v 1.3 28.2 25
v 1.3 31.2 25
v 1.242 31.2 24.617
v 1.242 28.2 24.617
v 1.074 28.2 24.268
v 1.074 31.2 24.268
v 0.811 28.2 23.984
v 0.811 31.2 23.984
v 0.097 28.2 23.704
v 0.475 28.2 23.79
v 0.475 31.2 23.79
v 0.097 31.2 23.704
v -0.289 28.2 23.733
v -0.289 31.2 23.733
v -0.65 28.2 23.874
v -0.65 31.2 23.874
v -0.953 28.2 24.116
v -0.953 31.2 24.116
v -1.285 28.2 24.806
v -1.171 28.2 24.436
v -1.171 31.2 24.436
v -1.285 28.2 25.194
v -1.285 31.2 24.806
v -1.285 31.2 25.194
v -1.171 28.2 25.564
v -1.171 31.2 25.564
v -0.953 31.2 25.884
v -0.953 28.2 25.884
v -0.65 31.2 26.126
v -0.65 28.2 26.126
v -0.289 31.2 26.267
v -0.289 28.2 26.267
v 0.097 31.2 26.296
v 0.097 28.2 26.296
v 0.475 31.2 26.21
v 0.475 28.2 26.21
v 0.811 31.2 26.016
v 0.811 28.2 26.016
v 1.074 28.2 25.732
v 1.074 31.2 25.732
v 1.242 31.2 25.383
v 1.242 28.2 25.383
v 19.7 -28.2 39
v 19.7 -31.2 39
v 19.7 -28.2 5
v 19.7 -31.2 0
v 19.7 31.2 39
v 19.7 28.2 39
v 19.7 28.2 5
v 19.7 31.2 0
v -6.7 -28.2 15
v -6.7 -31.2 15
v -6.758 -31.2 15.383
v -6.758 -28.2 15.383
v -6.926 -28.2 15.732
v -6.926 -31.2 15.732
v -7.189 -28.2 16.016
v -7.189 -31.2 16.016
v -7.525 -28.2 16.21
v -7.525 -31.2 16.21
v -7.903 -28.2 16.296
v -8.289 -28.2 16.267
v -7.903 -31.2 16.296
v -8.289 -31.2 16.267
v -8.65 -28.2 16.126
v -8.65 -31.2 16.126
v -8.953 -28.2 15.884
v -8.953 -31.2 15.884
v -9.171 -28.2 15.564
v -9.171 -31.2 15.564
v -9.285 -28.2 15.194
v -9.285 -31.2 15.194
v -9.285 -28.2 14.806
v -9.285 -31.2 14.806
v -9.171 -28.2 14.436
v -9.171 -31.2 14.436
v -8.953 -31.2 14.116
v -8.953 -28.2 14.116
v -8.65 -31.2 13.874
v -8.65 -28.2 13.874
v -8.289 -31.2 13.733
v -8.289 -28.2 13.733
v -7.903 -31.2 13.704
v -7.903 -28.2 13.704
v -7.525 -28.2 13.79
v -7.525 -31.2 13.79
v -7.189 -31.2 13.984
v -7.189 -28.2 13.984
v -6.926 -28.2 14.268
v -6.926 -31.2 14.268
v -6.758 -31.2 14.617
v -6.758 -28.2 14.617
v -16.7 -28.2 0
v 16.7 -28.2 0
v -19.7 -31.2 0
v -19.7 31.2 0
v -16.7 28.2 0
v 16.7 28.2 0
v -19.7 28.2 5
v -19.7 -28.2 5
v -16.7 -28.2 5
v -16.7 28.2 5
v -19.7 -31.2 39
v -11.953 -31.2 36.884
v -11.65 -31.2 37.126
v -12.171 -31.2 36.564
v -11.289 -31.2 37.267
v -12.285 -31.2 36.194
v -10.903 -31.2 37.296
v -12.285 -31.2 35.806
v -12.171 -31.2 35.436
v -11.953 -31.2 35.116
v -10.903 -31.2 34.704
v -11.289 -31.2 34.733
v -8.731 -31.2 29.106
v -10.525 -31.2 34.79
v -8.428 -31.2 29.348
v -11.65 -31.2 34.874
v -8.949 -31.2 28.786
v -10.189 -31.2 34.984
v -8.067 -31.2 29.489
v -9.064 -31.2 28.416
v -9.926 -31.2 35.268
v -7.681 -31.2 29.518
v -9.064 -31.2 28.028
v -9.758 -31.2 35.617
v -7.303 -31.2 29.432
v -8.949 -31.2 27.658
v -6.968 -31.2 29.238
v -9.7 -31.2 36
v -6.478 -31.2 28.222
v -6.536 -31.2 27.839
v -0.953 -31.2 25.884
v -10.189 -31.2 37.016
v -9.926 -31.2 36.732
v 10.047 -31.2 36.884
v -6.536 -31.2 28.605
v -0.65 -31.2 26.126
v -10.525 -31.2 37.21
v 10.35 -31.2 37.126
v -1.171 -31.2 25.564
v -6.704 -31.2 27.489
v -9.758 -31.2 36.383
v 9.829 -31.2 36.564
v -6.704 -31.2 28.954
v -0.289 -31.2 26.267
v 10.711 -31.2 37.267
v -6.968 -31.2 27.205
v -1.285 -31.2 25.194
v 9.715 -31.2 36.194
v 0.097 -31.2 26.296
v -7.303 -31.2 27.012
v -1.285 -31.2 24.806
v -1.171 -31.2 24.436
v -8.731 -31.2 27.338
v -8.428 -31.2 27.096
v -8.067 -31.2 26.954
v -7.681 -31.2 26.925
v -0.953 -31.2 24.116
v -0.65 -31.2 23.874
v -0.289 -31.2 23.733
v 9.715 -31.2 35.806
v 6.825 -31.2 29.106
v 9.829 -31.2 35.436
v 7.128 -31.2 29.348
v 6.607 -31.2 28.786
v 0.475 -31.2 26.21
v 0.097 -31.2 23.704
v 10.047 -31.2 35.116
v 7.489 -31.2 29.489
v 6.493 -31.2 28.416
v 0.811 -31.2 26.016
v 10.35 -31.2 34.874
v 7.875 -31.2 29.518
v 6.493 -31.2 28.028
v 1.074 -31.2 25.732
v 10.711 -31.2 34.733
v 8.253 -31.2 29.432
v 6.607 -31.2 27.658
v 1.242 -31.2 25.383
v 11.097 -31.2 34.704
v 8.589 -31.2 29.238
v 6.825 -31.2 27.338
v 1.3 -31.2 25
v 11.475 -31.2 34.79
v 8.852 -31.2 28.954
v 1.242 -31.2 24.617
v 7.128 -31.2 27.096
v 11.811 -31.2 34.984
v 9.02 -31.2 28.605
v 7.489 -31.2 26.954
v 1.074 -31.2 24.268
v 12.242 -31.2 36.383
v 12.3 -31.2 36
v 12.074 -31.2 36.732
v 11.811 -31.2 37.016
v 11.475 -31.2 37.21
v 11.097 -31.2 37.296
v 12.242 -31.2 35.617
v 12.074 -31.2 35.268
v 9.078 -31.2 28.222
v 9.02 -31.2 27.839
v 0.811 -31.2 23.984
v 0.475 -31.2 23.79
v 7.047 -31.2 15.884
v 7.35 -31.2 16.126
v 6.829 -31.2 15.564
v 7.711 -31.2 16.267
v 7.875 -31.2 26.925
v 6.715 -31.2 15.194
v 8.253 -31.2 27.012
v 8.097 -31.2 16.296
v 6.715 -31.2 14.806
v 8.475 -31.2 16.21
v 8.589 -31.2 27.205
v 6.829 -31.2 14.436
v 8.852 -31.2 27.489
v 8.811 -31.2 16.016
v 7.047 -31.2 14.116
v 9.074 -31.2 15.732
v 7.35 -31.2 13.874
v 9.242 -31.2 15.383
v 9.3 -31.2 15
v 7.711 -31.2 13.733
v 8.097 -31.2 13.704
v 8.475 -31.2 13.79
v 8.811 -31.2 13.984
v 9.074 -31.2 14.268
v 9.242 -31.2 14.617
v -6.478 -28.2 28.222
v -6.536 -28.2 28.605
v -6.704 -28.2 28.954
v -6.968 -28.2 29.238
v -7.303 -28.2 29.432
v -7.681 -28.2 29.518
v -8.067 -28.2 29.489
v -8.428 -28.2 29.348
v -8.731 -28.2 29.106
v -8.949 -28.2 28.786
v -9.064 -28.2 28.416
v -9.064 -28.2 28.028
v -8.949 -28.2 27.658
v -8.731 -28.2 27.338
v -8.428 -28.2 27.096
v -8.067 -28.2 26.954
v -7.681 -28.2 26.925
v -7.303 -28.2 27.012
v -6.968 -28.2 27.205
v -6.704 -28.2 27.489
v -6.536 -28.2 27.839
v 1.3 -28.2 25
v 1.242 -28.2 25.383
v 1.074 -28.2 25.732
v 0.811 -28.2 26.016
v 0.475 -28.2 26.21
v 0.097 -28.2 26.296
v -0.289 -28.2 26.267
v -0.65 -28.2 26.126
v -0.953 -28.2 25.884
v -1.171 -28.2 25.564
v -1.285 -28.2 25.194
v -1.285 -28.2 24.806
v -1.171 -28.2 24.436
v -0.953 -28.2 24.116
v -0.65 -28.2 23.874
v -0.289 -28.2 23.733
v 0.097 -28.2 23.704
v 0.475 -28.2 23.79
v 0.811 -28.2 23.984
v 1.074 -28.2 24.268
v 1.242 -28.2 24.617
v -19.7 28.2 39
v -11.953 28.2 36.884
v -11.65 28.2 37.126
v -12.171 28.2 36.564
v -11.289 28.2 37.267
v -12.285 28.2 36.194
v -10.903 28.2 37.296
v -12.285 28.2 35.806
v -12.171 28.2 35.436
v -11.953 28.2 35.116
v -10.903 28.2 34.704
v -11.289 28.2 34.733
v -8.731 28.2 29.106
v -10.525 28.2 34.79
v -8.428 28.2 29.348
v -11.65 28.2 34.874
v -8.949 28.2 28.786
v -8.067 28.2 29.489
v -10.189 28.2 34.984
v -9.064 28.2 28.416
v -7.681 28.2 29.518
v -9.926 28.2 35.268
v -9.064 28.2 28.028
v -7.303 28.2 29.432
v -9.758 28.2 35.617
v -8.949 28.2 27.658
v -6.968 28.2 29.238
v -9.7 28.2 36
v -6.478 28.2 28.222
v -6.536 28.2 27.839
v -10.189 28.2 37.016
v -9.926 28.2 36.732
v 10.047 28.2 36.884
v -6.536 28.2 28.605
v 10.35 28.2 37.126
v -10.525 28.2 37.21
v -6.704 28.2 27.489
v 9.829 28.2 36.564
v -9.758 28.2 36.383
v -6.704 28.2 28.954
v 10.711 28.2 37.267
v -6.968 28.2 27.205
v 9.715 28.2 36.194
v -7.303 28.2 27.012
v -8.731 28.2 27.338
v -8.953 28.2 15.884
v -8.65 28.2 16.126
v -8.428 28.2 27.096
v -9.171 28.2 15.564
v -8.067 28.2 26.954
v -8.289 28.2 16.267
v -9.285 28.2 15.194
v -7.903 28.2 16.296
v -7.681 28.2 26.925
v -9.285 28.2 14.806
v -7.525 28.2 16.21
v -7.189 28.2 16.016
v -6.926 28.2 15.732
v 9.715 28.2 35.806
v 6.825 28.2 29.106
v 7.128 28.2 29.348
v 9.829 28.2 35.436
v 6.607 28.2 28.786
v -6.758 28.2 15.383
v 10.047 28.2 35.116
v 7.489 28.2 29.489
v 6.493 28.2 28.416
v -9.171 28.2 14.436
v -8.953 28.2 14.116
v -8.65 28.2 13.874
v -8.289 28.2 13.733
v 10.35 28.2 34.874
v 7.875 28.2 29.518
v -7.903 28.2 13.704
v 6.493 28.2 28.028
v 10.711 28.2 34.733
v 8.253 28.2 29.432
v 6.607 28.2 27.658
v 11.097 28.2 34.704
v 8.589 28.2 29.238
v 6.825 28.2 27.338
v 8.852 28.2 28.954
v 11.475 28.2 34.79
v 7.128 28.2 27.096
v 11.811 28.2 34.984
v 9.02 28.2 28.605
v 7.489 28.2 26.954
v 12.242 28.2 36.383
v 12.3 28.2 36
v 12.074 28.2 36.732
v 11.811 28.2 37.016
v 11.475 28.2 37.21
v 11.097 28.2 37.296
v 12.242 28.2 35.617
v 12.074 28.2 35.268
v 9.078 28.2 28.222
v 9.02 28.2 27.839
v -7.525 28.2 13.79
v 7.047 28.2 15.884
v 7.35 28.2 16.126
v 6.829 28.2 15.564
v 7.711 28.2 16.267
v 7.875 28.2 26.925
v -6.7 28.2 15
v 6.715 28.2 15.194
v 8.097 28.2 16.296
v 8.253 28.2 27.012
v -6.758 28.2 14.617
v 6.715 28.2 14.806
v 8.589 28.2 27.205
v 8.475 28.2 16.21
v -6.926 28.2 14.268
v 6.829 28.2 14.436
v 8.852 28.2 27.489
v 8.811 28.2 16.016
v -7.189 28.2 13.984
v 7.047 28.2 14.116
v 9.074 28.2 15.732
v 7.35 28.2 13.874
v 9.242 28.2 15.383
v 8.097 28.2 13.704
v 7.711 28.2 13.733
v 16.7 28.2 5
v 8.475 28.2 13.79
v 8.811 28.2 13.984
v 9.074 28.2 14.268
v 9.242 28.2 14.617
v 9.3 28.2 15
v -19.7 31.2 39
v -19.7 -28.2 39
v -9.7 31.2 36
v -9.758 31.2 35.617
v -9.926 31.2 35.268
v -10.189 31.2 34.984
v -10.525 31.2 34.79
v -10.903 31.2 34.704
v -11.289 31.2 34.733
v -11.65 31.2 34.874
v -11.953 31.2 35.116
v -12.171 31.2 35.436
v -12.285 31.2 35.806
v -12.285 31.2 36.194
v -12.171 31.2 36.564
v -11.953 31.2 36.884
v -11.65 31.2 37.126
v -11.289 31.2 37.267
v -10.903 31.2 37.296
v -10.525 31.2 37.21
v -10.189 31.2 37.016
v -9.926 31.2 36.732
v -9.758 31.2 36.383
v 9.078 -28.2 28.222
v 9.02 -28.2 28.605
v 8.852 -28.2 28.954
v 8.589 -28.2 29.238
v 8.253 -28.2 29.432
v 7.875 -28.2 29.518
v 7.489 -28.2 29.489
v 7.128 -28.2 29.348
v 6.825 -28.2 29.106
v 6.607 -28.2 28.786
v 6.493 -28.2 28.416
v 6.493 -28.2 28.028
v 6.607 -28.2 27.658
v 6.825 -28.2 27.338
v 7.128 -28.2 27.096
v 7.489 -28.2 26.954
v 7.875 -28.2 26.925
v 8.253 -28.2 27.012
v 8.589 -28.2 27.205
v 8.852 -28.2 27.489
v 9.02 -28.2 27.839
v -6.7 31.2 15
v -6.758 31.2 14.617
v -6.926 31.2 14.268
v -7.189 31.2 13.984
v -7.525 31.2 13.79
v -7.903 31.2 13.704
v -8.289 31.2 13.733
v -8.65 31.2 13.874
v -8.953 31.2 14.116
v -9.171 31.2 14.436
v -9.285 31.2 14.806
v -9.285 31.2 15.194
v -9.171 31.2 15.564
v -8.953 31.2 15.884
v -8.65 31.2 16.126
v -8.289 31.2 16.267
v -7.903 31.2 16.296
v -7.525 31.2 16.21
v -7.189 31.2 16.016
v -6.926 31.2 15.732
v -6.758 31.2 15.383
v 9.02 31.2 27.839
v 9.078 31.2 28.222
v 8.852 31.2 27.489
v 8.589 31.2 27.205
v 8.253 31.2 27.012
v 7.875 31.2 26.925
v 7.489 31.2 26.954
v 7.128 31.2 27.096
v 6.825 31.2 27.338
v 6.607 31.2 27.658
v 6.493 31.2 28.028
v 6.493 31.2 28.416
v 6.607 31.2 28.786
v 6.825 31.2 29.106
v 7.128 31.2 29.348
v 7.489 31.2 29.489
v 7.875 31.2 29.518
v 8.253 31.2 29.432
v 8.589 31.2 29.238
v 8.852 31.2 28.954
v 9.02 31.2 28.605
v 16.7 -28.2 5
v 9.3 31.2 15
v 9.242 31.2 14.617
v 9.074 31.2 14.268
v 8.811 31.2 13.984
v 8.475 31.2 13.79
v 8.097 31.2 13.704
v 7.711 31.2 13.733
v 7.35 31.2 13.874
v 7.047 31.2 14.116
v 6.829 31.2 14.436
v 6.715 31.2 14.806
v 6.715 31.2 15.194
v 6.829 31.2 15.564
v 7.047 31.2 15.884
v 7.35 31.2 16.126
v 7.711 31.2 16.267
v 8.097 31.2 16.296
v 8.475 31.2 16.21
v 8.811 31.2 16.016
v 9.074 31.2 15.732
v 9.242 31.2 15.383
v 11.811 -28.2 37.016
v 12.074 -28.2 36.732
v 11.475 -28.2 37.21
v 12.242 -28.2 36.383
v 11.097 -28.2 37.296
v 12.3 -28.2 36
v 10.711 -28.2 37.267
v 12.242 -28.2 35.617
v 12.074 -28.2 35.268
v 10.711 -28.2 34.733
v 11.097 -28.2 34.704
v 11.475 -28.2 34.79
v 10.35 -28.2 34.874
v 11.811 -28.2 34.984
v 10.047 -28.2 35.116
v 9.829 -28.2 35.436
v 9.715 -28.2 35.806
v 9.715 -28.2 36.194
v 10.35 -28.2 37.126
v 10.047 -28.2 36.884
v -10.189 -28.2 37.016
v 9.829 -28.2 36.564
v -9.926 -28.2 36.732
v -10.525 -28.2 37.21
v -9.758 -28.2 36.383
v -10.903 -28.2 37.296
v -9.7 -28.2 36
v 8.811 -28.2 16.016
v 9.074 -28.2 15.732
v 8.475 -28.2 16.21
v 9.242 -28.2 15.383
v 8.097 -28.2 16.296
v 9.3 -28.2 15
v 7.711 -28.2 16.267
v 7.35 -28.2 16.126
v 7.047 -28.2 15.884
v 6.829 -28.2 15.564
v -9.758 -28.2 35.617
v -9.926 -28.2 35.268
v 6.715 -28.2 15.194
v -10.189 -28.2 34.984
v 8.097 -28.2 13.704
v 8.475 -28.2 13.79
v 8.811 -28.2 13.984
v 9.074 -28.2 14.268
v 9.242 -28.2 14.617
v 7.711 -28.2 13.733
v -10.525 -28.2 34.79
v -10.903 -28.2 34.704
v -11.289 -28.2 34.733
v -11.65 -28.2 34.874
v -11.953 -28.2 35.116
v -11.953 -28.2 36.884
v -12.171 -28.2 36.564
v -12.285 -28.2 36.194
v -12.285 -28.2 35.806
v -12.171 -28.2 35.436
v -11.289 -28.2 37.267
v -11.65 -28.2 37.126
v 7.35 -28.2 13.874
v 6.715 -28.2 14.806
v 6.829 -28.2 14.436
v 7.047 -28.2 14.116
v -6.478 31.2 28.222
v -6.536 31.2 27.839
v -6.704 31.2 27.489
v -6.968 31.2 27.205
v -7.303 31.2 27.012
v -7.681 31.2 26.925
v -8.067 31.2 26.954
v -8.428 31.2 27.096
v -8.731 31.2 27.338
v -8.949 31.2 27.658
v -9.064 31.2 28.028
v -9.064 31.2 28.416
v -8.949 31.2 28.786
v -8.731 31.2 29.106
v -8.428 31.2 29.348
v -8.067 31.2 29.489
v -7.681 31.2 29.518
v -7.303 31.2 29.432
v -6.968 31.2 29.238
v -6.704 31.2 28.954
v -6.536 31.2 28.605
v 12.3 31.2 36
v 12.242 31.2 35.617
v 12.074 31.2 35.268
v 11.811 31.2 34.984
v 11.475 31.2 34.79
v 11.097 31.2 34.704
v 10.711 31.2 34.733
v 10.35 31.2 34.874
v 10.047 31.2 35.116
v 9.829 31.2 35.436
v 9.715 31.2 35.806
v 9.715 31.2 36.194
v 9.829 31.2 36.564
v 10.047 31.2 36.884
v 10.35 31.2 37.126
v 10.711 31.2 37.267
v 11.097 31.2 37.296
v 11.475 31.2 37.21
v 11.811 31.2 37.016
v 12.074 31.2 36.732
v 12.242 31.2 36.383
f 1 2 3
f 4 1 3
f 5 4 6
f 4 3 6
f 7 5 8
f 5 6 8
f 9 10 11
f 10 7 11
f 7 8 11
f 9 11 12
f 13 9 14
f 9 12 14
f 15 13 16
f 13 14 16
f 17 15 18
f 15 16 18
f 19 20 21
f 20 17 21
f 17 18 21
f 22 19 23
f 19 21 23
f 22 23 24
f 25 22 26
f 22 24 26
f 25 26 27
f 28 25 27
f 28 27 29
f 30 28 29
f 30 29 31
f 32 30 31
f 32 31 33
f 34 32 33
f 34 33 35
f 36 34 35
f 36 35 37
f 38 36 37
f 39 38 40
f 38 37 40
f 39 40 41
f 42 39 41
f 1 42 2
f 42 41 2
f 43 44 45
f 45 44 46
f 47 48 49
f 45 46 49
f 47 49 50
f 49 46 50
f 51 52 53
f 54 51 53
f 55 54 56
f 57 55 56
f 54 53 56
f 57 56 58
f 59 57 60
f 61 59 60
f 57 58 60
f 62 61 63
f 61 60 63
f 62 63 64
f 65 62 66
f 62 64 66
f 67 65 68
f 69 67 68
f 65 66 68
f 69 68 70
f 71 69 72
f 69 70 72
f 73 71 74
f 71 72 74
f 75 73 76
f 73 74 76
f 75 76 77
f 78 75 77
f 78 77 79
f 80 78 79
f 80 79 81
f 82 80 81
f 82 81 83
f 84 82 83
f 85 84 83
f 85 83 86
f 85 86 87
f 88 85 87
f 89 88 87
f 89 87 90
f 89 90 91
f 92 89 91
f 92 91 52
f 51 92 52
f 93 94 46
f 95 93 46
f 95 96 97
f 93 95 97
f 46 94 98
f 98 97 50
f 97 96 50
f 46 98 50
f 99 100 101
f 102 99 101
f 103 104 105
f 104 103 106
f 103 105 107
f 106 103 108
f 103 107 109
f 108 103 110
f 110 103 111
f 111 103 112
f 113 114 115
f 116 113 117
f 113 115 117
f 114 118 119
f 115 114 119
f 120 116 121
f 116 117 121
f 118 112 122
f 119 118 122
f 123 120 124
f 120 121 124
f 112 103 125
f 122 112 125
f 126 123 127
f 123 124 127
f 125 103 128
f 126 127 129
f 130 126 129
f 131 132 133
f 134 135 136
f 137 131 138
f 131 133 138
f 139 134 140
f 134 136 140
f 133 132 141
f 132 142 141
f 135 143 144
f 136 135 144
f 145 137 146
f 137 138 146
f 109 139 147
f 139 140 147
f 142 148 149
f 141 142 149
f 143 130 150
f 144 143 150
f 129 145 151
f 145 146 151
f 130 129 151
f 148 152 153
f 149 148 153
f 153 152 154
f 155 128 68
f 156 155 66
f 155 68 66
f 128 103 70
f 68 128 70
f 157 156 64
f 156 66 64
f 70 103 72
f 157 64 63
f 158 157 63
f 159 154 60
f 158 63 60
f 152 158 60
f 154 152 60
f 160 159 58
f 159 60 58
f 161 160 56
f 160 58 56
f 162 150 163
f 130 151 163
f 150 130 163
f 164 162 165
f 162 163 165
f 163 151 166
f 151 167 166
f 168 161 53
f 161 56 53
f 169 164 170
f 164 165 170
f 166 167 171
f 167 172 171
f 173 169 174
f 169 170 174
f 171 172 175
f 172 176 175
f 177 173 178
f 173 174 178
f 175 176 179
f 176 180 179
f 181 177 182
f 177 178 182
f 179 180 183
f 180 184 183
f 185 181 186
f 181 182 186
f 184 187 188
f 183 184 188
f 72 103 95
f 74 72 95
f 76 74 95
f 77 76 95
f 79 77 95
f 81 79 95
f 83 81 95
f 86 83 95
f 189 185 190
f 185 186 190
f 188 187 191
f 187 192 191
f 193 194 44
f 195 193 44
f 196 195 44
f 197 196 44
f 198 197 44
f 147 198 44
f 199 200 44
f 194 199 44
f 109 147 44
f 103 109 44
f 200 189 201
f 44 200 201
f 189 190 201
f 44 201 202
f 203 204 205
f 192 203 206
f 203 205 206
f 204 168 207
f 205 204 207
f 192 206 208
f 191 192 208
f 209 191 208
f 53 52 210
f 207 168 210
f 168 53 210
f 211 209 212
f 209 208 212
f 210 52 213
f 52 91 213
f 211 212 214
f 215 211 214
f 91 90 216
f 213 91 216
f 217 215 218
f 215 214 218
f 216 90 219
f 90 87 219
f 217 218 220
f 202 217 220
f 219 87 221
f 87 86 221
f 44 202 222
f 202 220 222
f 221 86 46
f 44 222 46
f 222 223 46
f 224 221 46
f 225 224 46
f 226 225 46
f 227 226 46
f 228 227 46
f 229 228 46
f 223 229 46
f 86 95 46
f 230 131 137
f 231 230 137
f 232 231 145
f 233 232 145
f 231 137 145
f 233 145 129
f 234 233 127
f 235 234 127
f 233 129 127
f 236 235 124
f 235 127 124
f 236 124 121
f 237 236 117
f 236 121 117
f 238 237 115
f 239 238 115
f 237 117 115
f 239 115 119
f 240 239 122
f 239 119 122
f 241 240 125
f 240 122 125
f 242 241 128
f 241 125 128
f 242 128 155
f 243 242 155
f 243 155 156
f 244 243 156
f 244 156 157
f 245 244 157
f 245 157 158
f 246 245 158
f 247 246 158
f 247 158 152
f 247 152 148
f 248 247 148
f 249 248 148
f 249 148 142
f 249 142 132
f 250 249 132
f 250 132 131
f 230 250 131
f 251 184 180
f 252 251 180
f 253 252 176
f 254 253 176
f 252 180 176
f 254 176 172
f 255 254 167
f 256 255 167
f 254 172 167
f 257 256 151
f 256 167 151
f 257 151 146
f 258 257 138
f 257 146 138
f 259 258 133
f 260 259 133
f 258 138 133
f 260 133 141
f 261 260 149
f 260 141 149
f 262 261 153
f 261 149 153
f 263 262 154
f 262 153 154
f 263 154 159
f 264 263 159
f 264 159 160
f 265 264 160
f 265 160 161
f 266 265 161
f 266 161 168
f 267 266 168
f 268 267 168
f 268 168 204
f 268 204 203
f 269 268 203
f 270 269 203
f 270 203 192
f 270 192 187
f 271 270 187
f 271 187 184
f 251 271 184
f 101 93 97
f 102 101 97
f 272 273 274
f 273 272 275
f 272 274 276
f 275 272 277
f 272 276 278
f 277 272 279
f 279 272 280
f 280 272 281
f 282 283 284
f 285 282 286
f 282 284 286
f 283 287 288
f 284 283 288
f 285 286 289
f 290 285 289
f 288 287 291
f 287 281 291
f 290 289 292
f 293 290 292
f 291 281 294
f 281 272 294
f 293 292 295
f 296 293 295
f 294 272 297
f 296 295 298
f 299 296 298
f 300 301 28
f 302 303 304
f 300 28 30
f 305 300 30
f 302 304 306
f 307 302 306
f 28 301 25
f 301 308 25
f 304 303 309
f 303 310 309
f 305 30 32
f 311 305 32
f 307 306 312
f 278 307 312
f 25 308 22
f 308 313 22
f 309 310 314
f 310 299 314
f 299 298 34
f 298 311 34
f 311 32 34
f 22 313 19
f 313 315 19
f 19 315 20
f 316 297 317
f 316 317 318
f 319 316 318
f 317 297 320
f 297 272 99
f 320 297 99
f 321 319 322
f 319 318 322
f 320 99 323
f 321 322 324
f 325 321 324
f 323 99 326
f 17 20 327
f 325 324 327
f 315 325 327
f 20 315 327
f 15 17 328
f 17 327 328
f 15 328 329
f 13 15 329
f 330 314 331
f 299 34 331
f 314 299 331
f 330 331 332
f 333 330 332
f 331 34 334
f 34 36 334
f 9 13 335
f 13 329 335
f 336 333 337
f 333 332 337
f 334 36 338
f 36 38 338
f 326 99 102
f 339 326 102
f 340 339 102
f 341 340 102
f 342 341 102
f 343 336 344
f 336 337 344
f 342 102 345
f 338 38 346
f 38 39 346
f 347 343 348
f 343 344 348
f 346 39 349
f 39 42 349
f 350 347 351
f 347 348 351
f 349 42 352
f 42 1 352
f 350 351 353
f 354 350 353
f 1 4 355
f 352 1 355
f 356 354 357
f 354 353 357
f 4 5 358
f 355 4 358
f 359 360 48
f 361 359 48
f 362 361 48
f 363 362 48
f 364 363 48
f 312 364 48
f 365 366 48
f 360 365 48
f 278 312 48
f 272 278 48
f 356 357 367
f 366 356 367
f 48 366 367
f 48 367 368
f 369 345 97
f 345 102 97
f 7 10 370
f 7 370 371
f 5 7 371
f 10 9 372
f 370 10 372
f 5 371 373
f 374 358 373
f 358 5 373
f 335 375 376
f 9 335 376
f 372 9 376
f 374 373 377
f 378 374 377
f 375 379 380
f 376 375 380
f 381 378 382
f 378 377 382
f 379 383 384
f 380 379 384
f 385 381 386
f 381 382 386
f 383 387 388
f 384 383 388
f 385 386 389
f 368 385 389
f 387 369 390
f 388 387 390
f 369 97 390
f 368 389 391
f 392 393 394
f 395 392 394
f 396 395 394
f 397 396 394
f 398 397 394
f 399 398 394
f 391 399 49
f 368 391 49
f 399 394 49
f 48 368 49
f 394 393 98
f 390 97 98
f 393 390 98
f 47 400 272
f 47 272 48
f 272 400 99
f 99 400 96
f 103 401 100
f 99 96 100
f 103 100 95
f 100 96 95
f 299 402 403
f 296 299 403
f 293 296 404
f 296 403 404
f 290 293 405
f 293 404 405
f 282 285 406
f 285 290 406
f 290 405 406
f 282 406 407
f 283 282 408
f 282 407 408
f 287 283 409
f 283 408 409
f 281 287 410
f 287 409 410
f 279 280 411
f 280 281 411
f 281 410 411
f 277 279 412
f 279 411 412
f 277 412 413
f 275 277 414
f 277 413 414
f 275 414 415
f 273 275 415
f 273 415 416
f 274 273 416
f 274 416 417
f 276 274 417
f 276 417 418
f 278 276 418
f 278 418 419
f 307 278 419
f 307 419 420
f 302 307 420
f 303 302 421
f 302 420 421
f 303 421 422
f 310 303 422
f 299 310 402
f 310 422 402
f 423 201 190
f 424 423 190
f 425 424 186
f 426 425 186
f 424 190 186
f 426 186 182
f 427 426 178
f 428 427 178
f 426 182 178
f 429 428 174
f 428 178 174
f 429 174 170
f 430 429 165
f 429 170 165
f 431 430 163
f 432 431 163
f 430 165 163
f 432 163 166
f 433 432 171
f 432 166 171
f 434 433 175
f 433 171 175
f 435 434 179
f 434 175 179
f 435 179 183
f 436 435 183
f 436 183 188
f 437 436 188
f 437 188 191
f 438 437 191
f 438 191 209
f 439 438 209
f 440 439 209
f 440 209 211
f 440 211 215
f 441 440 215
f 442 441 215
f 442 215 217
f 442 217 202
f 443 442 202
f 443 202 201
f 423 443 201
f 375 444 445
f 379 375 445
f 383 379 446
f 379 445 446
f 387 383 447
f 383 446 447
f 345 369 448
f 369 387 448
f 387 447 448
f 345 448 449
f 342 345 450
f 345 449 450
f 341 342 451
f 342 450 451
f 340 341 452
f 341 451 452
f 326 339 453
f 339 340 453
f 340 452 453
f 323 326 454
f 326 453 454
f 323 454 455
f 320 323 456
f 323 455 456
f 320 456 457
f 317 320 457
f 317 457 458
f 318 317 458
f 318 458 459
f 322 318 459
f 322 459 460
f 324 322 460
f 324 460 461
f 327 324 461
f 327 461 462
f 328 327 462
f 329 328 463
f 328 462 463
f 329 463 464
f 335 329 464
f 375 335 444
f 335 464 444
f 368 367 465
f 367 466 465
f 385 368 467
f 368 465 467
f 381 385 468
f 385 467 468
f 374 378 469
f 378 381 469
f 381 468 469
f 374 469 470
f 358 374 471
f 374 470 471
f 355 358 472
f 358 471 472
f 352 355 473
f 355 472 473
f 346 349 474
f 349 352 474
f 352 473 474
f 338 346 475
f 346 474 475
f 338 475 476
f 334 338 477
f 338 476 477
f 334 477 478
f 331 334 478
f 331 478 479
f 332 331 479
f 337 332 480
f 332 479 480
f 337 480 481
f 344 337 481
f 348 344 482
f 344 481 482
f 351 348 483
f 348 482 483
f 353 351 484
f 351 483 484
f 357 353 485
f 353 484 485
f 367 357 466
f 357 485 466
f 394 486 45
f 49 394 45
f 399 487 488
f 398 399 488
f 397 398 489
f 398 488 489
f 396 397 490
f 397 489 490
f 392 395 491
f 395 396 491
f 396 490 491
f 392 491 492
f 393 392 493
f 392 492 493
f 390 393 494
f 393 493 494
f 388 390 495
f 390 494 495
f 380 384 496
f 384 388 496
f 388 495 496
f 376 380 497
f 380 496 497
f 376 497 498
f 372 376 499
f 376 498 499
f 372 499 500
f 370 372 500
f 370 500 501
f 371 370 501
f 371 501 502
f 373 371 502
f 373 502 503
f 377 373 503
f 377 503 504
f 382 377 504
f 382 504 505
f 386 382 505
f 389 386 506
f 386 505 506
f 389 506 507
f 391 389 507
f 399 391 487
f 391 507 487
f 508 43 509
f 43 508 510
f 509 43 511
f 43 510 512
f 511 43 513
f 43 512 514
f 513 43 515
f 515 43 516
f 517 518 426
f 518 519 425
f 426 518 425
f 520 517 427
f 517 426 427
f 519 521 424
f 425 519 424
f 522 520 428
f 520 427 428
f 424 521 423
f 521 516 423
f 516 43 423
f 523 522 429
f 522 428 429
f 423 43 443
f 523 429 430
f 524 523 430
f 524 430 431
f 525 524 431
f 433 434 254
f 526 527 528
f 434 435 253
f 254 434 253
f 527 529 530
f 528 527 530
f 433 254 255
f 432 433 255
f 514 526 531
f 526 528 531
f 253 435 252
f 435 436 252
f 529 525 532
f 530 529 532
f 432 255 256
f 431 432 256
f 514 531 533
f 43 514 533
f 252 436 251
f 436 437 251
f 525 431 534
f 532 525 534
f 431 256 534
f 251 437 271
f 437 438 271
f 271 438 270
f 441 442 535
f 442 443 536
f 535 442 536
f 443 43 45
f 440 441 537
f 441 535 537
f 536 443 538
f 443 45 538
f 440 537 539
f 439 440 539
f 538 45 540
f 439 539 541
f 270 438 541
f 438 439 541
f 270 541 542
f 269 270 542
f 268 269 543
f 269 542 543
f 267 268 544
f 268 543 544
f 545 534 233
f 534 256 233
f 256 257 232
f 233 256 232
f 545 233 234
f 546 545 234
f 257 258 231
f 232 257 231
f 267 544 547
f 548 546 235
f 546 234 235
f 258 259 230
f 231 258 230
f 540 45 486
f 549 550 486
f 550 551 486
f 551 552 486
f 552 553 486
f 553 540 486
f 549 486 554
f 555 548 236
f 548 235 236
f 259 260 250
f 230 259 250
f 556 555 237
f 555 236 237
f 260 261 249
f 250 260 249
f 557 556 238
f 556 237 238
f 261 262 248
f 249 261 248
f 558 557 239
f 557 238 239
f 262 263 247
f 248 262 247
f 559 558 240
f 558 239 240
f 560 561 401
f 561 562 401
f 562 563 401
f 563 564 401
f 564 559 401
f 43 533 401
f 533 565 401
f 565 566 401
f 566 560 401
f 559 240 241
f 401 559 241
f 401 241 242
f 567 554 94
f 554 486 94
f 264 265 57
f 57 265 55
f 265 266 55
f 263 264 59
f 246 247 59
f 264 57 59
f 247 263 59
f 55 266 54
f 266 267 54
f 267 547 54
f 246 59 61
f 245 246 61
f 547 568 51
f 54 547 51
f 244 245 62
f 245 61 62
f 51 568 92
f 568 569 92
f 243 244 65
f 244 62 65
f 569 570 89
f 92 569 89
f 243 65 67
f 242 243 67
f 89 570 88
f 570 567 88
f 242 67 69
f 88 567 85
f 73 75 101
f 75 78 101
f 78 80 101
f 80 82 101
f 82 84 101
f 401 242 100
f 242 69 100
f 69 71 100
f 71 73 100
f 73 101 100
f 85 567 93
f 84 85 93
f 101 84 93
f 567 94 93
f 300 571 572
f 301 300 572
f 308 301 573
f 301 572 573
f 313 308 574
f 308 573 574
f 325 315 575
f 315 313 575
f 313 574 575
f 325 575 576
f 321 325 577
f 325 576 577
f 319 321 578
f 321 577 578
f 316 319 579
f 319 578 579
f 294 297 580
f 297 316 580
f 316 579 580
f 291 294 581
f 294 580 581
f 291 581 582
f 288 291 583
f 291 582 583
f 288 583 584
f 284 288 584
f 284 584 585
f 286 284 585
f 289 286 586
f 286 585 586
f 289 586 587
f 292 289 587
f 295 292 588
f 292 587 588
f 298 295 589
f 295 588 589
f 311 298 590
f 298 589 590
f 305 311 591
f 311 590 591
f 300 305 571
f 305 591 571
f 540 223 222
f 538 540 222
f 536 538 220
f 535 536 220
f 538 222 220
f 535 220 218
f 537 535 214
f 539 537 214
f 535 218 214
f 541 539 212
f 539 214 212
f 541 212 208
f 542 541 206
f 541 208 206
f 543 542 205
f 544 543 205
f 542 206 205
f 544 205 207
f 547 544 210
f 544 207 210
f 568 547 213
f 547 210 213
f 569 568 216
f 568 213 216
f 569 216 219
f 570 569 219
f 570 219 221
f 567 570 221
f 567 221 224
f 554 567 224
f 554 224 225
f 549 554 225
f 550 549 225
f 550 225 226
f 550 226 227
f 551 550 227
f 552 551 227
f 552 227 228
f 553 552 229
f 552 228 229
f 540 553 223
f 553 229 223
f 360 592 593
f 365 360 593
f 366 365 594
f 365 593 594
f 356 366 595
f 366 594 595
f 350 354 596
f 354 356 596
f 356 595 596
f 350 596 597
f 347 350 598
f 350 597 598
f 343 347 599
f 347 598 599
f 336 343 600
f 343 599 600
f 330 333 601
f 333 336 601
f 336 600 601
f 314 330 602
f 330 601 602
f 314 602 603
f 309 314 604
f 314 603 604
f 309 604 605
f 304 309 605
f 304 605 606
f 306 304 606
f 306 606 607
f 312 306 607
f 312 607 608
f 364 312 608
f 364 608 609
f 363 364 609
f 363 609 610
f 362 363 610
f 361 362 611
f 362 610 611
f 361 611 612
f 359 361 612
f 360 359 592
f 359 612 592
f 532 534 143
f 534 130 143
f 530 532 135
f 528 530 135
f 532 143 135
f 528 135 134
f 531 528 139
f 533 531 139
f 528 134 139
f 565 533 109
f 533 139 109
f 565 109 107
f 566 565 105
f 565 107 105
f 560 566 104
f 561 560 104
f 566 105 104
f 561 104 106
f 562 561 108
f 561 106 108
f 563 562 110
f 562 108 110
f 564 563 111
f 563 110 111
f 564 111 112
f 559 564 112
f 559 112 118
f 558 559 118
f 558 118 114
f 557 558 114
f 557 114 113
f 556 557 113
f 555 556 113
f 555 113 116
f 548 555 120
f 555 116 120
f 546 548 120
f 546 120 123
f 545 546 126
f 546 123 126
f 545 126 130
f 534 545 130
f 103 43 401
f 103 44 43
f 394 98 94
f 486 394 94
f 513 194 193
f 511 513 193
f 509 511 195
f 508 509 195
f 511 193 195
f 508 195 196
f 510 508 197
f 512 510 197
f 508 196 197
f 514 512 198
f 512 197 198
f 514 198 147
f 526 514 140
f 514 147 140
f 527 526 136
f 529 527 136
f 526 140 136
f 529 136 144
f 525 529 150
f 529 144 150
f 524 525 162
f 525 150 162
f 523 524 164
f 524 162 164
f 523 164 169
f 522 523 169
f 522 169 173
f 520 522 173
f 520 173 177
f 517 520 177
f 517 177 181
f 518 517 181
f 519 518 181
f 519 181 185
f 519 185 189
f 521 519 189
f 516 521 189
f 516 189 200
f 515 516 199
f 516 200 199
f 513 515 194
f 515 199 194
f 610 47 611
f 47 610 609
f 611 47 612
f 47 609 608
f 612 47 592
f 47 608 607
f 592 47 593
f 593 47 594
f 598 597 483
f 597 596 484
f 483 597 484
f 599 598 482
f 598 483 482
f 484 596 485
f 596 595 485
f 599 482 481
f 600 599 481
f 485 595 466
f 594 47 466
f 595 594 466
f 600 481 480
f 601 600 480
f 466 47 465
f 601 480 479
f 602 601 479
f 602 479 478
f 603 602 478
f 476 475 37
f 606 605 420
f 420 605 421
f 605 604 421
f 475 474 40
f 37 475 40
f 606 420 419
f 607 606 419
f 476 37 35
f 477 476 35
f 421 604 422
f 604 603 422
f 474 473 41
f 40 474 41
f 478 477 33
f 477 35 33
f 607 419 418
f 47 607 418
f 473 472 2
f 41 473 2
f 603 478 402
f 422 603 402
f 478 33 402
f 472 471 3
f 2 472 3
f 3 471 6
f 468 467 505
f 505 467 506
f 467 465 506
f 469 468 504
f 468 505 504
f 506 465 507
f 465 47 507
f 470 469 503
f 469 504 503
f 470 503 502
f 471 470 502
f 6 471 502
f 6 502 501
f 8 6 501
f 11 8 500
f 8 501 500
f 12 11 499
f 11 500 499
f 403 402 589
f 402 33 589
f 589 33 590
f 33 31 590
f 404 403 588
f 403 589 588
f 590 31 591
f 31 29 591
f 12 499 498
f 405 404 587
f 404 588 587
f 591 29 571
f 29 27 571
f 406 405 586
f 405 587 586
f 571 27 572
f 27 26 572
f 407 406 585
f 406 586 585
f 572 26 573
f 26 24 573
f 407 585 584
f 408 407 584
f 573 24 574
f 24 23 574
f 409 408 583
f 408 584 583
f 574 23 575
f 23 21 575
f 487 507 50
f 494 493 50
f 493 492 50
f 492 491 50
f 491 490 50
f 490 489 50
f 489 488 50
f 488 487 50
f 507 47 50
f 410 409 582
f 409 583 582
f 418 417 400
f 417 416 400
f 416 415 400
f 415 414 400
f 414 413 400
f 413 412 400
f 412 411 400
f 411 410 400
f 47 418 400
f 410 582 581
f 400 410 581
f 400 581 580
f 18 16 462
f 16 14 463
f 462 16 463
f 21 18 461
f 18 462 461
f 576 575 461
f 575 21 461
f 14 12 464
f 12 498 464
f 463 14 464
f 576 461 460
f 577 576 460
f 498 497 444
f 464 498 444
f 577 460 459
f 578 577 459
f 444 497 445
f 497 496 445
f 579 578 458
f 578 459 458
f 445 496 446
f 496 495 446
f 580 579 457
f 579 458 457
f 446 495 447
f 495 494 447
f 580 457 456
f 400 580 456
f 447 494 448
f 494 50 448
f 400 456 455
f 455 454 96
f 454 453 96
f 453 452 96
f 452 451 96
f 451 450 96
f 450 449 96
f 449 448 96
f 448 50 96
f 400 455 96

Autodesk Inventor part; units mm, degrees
ref_plane "YZ Plane" through (0, 0, 0) normal (1, 0, 0) x (0, 1, 0)
ref_plane "XZ Plane" through (0, 0, 0) normal (0, 1, 0) x (-1, 0, 0)
ref_plane "XY Plane" through (0, 0, 0) normal (0, 0, 1) x (1, 0, 0)
sketch "스케치1" plane through (0, 0, 0) normal (0, 0, 1) x (1, 0, 0)
  line L0 (-16.7, 28.2) -> (16.7, 28.2)
  line L1 (16.7, 28.2) -> (16.7, -28.2)
  line L2 (16.7, -28.2) -> (-16.7, -28.2)
  line L3 (-16.7, -28.2) -> (-16.7, 28.2)
  line L4 (19.7, -31.2) -> (19.7, 31.2)
  line L5 (19.7, 31.2) -> (-19.7, 31.2)
  line L6 (-19.7, 31.2) -> (-19.7, -31.2)
  line L7 (-19.7, -31.2) -> (19.7, -31.2)
  point P0 (0, 0)
  point P1 (-16.7, 0)
  point P2 (0, 28.2)
  dimension "d0" = 33.4
  dimension "d1" = 56.4
  dimension "d2" = 3
extrude "돌출1" add sketch "스케치1" along normal blind 5
sketch "스케치3" plane through (-19.7, -31.2, 0) normal (0, -1, 0) x (1, 0, 0)
  line L0 (39.4, 0) -> (0, 0) projected
  line L1 (0, 0) -> (39.4, 0)
  line L2 (39.4, 0) -> (39.4, 39)
  line L3 (39.4, 39) -> (0, 39)
  line L4 (0, 39) -> (0, 0)
  line L5 (19.7, 39) -> (19.7, 0) construction
  line L6 (0, 36) -> (39.4, 36) construction
  circle A0 centre (19.7, 36) radius 11 construction
  circle A1 centre (8.7, 36) radius 1.3
  circle A2 centre (11.9218, 28.2218) radius 1.3
  circle A3 centre (19.7, 25) radius 1.3
  circle A4 centre (27.4782, 28.2218) radius 1.3
  circle A5 centre (30.7, 36) radius 1.3
  line L7 (0, 15) -> (39.4, 15) construction
  circle A6 centre (11.7, 15) radius 1.3
  circle A7 centre (27.7, 15) radius 1.3
  point P0 (39.4, 0)
  dimension "d9" = 22
  dimension "d5" = 39
  dimension "d8" = 3
  dimension "d10" = 2.6
  dimension "d13" = 180
  dimension "d15" = 24
  dimension "d16" = 2.6
  dimension "d17" = 2.6
  dimension "d18" = 8
  dimension "d19" = 8
extrude "돌출2" add sketch "스케치3" against normal blind 3
mirror "미러1" about plane through (0, 0, 0) normal (0, 1, 0)
properties part number "ARM_1 SKETCH"
